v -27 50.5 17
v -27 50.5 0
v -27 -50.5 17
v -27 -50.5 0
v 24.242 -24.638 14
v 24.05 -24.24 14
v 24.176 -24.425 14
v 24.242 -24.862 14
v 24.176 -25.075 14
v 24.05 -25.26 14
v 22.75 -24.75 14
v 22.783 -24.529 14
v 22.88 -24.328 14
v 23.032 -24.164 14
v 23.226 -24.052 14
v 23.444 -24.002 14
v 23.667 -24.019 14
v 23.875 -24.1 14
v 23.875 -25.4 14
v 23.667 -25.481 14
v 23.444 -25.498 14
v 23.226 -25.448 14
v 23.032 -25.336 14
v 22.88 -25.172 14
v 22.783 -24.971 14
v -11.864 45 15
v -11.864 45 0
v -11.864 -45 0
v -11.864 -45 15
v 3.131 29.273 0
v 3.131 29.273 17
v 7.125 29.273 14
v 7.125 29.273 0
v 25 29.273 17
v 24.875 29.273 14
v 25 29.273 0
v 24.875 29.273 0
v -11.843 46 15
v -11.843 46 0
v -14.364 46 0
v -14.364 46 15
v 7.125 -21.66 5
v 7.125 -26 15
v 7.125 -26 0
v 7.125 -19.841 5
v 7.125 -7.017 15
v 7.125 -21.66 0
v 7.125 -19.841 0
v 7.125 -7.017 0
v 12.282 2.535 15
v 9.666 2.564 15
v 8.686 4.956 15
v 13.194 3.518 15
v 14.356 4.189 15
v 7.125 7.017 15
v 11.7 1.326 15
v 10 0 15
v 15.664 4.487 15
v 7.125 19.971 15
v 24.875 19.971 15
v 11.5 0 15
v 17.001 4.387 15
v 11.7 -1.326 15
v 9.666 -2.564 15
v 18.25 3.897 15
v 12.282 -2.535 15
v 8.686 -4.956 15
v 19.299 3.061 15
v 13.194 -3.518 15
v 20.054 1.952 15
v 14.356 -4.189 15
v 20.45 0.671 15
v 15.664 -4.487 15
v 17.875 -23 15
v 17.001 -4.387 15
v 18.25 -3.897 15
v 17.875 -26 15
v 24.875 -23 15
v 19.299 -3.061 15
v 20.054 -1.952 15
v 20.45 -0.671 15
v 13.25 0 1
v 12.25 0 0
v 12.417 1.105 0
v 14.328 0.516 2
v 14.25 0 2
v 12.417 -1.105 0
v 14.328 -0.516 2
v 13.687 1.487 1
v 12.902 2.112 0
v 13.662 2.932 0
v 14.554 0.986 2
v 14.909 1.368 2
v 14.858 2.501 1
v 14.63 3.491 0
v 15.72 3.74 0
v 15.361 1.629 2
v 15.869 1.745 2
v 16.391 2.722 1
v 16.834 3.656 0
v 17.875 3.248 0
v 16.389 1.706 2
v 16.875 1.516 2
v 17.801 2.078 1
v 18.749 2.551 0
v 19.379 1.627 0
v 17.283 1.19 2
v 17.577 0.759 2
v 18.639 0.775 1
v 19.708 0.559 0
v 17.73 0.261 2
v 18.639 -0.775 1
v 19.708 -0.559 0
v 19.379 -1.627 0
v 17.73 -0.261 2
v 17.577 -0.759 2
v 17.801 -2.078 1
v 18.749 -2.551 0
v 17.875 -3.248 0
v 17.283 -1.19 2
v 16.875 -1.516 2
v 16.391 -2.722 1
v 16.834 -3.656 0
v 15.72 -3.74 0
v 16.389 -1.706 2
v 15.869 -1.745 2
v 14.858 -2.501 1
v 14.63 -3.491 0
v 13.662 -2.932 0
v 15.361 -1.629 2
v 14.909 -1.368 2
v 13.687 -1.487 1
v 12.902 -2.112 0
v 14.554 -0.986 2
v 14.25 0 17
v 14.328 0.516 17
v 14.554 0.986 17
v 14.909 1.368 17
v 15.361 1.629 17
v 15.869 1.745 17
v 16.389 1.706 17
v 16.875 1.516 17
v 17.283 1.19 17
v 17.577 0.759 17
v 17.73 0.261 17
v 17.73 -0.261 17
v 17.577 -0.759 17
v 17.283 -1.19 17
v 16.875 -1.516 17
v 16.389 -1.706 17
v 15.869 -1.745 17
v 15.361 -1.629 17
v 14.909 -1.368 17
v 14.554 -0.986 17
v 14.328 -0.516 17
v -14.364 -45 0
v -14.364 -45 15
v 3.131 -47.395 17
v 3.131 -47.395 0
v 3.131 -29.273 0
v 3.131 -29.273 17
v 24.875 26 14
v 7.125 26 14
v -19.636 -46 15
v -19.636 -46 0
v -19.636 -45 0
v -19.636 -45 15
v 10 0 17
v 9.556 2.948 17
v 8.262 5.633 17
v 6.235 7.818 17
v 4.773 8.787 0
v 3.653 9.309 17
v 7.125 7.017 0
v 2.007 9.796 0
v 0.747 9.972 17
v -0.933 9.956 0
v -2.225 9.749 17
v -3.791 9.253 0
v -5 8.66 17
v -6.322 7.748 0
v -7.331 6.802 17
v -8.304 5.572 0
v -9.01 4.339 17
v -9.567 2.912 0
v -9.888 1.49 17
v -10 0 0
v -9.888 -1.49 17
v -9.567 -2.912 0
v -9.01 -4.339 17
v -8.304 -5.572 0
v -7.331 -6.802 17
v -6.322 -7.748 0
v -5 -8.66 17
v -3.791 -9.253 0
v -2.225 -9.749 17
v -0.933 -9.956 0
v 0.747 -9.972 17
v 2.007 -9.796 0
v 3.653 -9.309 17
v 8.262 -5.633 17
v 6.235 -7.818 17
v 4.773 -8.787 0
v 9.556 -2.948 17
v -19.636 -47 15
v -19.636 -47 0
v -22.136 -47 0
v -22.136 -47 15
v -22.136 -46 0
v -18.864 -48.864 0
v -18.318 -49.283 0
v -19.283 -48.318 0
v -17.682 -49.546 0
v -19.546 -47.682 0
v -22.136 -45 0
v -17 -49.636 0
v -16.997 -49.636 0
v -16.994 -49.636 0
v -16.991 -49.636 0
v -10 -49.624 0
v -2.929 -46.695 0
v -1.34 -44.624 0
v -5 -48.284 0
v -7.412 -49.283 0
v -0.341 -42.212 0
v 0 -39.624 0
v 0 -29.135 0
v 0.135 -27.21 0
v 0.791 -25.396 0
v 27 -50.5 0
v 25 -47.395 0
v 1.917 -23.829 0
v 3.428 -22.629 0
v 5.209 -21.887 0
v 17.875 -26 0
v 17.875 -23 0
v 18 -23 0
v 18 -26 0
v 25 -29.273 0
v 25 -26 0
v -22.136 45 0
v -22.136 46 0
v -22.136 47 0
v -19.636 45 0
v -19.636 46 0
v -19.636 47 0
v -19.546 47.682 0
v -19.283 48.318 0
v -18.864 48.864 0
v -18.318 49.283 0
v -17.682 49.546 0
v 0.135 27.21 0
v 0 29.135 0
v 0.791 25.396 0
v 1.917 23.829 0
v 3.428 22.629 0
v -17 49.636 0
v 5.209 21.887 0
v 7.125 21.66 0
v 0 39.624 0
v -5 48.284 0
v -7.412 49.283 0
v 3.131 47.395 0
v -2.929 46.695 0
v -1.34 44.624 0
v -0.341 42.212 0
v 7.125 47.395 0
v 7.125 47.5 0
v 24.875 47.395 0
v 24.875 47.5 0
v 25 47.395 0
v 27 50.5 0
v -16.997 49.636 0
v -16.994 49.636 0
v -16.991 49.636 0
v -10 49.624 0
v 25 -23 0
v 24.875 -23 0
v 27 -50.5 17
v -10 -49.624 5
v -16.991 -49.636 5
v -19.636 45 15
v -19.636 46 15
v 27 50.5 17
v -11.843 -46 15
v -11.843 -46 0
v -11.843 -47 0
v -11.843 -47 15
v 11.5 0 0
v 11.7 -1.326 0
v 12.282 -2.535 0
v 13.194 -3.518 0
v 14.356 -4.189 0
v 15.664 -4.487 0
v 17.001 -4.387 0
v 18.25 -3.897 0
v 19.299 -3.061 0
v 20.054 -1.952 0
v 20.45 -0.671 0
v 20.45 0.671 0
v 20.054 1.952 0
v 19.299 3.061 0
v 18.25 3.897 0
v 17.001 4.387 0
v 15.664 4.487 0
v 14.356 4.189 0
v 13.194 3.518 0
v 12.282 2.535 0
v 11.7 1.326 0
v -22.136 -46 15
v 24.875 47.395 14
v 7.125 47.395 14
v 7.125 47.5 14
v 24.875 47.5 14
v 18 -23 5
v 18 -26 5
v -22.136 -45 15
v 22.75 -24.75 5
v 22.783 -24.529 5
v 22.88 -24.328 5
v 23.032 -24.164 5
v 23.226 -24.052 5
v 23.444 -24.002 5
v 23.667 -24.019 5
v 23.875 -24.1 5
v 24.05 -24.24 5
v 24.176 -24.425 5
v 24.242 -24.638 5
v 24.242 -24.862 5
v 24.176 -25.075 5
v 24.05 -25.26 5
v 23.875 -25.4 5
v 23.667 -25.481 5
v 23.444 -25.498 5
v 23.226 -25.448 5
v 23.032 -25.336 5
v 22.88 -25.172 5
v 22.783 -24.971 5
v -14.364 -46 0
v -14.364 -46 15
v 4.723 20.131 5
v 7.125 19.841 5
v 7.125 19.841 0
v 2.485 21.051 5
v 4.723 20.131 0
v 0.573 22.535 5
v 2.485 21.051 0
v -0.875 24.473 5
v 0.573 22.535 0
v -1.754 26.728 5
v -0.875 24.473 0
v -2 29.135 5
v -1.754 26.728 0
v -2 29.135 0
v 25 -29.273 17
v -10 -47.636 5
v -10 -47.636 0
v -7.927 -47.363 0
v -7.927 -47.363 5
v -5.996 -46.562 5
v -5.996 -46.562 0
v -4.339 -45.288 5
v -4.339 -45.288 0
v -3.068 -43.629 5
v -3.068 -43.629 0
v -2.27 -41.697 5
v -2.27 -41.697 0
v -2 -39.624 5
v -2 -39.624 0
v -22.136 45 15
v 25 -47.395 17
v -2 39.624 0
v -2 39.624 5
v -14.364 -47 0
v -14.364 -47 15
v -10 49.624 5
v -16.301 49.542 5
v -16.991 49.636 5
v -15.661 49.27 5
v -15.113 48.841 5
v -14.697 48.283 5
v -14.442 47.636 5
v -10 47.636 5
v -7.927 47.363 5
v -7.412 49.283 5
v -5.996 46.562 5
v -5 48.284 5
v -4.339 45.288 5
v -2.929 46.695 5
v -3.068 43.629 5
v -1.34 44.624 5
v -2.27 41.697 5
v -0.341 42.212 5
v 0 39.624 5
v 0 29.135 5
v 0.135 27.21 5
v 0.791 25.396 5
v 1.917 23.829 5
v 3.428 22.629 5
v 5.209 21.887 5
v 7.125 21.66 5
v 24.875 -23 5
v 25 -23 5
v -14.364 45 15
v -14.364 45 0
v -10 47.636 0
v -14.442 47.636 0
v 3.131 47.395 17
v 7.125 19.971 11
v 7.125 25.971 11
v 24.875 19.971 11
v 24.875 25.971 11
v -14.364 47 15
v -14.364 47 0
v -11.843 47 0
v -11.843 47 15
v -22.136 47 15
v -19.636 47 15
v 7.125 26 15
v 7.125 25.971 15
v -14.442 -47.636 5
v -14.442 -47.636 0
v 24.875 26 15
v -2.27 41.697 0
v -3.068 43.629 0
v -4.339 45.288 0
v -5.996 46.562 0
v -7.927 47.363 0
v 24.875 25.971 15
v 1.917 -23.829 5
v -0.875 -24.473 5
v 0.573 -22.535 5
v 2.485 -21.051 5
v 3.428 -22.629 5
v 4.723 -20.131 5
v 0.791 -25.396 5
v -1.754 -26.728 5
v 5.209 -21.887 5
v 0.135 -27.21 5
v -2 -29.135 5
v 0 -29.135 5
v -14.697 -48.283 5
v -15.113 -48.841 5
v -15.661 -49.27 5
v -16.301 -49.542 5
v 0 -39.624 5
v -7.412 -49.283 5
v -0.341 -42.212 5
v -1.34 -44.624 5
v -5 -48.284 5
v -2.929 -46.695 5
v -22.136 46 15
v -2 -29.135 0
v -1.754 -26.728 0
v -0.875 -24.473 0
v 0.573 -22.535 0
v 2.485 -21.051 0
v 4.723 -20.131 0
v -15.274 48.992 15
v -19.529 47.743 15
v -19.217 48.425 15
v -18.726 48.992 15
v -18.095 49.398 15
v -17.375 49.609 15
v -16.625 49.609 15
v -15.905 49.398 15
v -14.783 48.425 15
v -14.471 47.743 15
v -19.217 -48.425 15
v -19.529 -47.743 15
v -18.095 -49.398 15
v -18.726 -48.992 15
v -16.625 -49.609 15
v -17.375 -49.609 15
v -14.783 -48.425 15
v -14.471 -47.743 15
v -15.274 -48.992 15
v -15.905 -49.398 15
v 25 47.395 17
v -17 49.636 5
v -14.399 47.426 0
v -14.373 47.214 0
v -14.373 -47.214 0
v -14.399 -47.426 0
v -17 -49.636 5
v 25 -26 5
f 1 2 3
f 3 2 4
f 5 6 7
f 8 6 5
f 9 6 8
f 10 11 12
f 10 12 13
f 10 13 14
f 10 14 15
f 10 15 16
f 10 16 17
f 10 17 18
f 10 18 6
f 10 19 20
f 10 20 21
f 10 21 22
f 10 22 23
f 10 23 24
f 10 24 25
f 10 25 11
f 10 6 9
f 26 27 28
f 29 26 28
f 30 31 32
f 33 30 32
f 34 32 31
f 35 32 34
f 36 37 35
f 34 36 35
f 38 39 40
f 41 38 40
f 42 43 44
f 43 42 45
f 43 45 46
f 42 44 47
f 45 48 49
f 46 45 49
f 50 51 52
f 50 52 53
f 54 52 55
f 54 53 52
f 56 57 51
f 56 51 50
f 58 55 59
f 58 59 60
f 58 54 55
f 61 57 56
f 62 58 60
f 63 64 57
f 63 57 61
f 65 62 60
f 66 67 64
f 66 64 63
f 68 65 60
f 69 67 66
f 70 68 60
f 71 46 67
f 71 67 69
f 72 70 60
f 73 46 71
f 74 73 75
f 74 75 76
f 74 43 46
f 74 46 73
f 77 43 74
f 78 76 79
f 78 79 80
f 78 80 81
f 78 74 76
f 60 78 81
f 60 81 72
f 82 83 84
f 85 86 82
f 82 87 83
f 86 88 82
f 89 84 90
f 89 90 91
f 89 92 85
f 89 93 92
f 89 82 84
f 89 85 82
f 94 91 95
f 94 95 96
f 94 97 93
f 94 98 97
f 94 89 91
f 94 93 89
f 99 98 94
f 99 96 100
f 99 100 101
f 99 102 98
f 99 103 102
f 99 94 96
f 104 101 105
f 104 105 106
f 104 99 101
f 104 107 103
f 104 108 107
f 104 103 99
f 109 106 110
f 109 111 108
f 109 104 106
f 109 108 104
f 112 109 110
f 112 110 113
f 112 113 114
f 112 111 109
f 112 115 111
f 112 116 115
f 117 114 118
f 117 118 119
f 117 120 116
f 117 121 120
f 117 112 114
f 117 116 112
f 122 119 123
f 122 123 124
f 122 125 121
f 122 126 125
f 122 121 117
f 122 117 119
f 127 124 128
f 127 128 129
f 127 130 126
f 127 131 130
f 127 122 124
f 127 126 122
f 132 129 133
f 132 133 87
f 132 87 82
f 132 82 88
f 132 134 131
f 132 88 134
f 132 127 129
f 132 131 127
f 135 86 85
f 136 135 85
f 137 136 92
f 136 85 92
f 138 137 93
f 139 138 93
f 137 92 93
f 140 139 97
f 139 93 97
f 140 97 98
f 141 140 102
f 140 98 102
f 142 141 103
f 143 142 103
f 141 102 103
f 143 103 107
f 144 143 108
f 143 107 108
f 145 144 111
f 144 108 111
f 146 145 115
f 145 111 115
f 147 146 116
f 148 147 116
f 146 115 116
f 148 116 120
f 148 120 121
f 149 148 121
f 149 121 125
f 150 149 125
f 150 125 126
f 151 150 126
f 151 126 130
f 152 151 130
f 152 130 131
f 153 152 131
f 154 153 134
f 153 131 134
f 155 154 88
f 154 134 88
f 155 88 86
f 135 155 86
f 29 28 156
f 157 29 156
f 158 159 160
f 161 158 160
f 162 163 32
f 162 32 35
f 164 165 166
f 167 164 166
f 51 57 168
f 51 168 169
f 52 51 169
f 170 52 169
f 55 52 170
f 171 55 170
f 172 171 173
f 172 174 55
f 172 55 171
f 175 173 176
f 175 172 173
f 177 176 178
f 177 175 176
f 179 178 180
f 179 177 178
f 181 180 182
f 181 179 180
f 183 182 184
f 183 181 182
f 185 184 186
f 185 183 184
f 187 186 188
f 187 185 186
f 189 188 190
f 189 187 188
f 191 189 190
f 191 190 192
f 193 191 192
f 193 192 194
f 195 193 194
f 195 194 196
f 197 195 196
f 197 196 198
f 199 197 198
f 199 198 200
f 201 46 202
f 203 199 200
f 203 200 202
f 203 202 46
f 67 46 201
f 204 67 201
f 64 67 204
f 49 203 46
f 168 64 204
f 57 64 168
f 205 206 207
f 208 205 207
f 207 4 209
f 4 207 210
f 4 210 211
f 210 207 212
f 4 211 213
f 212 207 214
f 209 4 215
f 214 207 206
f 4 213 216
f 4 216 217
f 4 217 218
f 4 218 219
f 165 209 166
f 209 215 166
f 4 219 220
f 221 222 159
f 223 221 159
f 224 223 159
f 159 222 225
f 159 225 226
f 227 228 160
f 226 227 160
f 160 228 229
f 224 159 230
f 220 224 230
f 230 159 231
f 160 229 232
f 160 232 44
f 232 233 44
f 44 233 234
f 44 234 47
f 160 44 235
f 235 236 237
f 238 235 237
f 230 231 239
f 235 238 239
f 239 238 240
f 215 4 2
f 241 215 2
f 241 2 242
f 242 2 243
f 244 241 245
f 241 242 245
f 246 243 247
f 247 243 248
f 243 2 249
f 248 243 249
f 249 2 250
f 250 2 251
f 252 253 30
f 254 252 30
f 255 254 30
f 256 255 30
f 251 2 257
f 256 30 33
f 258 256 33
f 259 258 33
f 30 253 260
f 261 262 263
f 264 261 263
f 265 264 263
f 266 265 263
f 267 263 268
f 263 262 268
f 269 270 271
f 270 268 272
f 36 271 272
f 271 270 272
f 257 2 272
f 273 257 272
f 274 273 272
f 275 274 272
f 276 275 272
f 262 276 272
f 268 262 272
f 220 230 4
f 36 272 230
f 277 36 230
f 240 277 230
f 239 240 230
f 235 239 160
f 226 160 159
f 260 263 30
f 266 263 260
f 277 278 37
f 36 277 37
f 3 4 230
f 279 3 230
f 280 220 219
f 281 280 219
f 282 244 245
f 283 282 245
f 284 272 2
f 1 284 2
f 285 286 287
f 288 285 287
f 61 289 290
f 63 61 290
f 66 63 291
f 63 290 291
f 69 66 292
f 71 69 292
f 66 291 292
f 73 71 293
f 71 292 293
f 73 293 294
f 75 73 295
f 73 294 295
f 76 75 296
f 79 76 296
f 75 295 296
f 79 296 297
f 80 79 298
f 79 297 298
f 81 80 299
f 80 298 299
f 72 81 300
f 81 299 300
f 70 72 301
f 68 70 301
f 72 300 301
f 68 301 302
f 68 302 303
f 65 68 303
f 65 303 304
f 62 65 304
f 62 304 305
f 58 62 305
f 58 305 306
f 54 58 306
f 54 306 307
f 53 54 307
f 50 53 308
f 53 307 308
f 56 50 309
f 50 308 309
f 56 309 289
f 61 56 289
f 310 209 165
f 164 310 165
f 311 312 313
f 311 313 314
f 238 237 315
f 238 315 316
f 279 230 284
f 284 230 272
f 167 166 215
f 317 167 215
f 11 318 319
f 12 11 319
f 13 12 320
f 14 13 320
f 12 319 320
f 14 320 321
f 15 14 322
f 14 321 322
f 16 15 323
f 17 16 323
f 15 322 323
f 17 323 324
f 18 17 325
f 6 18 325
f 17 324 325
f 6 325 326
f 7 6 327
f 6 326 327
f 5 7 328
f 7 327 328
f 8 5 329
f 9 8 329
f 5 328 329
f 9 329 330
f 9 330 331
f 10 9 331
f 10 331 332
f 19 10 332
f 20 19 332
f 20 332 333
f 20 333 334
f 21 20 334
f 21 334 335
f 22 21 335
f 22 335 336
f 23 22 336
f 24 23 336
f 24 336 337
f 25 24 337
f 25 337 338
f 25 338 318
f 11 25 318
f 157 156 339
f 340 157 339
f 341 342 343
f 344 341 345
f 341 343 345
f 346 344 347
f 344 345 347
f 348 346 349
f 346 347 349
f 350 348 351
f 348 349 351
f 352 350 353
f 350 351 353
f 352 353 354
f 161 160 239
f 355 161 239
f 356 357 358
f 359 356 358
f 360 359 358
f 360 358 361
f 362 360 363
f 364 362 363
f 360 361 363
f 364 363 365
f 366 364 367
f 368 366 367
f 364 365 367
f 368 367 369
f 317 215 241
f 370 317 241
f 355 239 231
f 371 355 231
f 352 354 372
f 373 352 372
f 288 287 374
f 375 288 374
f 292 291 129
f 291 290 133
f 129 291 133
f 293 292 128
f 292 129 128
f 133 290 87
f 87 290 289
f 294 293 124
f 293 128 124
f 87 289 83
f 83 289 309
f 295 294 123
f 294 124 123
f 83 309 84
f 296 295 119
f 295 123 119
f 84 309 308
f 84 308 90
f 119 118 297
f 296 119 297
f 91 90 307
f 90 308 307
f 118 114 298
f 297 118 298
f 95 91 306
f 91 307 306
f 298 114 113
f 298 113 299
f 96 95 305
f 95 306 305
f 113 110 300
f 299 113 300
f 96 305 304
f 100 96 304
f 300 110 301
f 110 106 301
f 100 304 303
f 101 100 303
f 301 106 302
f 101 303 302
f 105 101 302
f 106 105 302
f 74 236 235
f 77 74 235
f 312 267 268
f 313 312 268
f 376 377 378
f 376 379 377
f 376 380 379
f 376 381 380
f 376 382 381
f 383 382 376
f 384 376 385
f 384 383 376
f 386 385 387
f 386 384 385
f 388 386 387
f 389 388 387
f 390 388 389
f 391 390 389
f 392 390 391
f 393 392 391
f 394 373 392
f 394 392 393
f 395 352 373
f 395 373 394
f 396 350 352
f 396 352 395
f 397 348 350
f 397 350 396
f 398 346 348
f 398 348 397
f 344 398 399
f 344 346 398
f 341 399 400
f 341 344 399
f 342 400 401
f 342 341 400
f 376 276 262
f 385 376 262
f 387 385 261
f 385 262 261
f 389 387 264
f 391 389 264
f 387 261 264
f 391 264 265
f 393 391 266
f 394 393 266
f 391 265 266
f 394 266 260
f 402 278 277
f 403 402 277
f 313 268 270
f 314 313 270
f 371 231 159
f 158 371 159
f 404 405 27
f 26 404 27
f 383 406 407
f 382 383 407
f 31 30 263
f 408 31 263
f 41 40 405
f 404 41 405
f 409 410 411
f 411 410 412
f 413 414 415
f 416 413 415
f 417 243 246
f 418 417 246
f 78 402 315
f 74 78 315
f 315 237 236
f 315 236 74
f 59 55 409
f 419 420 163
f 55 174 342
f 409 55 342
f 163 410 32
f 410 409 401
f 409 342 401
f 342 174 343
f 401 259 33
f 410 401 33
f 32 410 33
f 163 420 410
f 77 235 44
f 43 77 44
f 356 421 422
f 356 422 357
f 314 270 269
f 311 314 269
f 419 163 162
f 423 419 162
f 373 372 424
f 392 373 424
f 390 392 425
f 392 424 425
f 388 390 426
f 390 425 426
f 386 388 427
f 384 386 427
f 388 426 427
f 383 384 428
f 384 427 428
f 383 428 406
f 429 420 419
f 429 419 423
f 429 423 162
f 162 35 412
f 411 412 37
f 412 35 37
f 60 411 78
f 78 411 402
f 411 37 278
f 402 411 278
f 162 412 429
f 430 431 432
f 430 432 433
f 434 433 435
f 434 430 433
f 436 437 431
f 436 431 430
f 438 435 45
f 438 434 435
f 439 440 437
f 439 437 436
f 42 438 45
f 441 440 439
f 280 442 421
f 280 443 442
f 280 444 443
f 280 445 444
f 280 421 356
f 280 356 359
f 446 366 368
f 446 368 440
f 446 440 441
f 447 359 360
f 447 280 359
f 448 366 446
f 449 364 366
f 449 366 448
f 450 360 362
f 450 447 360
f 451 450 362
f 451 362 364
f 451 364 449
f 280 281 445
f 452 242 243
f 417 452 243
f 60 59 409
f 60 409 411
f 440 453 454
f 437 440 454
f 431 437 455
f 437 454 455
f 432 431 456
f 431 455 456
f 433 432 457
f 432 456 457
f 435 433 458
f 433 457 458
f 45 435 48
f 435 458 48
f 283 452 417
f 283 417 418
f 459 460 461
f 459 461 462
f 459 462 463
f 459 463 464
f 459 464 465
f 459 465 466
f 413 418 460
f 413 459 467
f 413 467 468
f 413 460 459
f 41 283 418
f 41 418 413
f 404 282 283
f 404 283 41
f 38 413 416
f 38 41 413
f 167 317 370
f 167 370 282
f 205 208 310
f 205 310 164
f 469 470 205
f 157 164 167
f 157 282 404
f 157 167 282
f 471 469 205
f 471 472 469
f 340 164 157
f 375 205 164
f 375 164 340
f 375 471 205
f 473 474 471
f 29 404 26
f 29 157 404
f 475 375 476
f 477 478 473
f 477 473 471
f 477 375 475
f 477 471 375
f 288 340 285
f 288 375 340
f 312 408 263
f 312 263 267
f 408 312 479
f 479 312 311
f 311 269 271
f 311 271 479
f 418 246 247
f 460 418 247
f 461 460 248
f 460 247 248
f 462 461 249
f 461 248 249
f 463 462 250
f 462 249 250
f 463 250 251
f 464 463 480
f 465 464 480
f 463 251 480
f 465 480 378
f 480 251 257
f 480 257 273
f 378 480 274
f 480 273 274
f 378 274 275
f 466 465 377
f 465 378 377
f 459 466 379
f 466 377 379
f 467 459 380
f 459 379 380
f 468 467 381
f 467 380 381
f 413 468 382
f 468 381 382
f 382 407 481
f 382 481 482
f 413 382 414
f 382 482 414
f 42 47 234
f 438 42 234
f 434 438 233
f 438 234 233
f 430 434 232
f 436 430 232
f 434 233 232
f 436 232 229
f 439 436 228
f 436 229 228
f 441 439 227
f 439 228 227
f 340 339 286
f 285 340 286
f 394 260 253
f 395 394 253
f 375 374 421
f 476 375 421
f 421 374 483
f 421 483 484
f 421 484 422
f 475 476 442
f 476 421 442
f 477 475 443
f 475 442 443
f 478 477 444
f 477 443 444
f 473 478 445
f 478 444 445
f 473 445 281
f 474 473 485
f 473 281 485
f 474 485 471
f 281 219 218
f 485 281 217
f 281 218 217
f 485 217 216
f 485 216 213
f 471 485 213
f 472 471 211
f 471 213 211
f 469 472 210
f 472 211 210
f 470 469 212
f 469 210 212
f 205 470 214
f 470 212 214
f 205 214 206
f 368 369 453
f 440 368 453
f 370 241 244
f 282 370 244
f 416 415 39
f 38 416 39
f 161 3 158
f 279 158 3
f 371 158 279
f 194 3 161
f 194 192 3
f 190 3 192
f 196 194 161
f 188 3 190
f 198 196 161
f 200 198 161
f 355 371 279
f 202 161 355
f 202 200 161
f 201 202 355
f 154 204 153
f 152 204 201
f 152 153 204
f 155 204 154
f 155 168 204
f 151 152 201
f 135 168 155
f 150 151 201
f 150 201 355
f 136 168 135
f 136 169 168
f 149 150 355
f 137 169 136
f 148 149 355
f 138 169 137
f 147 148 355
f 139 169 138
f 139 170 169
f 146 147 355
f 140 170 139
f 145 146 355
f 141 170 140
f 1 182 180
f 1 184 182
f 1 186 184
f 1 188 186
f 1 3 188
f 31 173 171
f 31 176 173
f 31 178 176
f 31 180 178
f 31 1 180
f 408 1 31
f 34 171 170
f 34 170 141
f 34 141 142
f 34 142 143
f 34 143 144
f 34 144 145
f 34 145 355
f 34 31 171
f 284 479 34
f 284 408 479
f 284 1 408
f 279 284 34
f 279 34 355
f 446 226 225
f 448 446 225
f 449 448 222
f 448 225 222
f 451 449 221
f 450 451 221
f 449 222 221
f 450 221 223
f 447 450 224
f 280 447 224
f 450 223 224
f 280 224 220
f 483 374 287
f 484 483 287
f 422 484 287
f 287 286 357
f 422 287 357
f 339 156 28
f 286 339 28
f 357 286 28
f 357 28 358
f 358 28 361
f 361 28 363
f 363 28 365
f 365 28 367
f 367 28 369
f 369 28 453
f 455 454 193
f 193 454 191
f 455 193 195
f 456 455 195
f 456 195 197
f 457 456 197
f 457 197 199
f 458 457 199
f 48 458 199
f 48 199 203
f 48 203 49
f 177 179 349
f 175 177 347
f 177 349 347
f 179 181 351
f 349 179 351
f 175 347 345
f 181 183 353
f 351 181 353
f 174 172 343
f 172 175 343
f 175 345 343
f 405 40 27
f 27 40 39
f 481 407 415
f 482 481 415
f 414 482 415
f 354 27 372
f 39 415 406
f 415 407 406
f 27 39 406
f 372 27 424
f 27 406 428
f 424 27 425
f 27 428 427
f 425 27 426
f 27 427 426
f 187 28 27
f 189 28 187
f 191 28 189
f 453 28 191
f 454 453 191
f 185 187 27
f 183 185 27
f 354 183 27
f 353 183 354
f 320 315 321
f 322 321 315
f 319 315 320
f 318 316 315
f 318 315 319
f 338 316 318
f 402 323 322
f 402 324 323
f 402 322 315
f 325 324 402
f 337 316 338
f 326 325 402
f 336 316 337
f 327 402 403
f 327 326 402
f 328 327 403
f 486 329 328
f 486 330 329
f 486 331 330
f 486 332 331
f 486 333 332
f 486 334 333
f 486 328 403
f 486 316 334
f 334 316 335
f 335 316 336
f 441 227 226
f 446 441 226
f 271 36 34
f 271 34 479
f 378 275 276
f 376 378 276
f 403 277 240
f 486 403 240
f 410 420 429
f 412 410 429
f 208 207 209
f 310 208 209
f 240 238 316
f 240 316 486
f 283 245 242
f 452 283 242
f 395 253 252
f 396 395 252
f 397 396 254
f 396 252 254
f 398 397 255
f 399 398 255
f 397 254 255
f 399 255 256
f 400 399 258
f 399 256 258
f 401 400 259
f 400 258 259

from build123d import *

# Parameters (mm, degrees)
F0_R      = 10
F0_W      = 21.869414486
F0_H      = 18.1213598698
F1_DEPTH  = 17
F3_DEPTH  = 15
F4_W      = 7
F4_H      = 3
F5_DEPTH  = 5
F7_DEPTH  = 14
F8_SIZE   = 2
F9_W      = 18
F9_H      = 6
F10_DEPTH = 6


# Not quite as in the source:
# - a feature names something its author has since deleted; it is built from what else it names


with BuildPart() as f1:
    # F0 (on Top) → F1 (new body)
    with BuildSketch(Plane.XY):
        Polygon((27, -38.3339710534), (27, 50.5), (-27, 50.5), (-27, -50.5), (27, -50.5), align=None)
        Polygon((25, -29.2732911184), (25, -38.3339710534), (25, -47.3946509883), (3.130585514, -47.3946509883), (3.130585514, -29.2732911184), align=None, mode=Mode.SUBTRACT)
        Circle(F0_R, mode=Mode.SUBTRACT)
        with BuildLine():
            ThreePointArc((17.75, 0), (16, -1.75), (14.25, 0))
            ThreePointArc((14.25, 0), (16, 1.75), (17.75, 0))
        make_face(mode=Mode.SUBTRACT)
        with Locations((14.065292757, 38.3339710534)):
            Rectangle(F0_W, F0_H, mode=Mode.SUBTRACT)
    extrude(amount=F1_DEPTH)

    # F2 (on face) → F3 (cut)
    with BuildSketch(Plane(origin=(0, 0, 0), x_dir=(1, 0, 0), z_dir=(0, 0, -1))):
        Polygon((7.125, 26), (7.125, 0), (7.125, -26), (24.875, -26), (24.875, 23), (17.875, 23), (17.875, 26), align=None)
        with BuildLine():
            ThreePointArc((20.5, 0), (16, -4.5), (11.5, 0))
            ThreePointArc((11.5, 0), (16, 4.5), (20.5, 0))
        make_face(mode=Mode.SUBTRACT)
        with BuildLine():
            Line((-11.8641304348, -45), (-11.8641304348, 0))
            Line((-11.8641304348, 0), (-11.8641304348, 45))
            Line((-11.8641304348, 45), (-14.3641304348, 45))
            Line((-14.3641304348, 45), (-14.3641304348, 46))
            Line((-14.3641304348, 46), (-11.8431356333, 46))
            Line((-11.8431356333, 46), (-11.8431356333, 47))
            Line((-11.8431356333, 47), (-14.3641304348, 47))
            ThreePointArc((-14.3641304348, 47), (-17, 49.6358695652), (-19.6358695652, 47))
            Line((-19.6358695652, 47), (-22.1358695652, 47))
            Line((-22.1358695652, 47), (-22.1358695652, 46))
            Line((-22.1358695652, 46), (-19.6358695652, 46))
            Line((-19.6358695652, 46), (-19.6358695652, 45))
            Line((-19.6358695652, 45), (-22.1358695652, 45))
            Line((-22.1358695652, 45), (-22.1358695652, -45))
            Line((-22.1358695652, -45), (-19.6358695652, -45))
            Line((-19.6358695652, -45), (-19.6358695652, -46))
            Line((-19.6358695652, -46), (-22.1358695652, -46))
            Line((-22.1358695652, -46), (-22.1358695652, -47))
            Line((-22.1358695652, -47), (-19.6358695652, -47))
            ThreePointArc((-19.6358695652, -47), (-17, -49.6358695652), (-14.3641304348, -47))
            Line((-14.3641304348, -47), (-11.8431356333, -47))
            Line((-11.8431356333, -47), (-11.8431356333, -46))
            Line((-11.8431356333, -46), (-14.3641304348, -46))
            Line((-14.3641304348, -46), (-14.3641304348, -45))
            Line((-14.3641304348, -45), (-11.8641304348, -45))
        make_face()
    extrude(amount=-F3_DEPTH, mode=Mode.SUBTRACT)

    # F4 (on face) → F5 (cut)
    with BuildSketch(Plane(origin=(0, 0, 0), x_dir=(1, 0, 0), z_dir=(0, 0, -1))):
        with Locations((21.5, 24.5)):
            Rectangle(F4_W, F4_H)
        with BuildLine():
            Line((0, 29.1349645704), (0, 39.6236035006))
            ThreePointArc((0, 39.6236035006), (-2.9289321881, 46.6946713125), (-10, 49.6236035006))
            Line((-10, 49.6236035006), (-17, 49.6358695652))
            Line((-17, 49.6358695652), (-17, 47.6358695652))
            Line((-17, 47.6358695652), (-10, 47.6358695652))
            ThreePointArc((-10, 47.6358695652), (-4.3388107028, 45.2883854424), (-2.0000094035, 39.6236035006))
            Line((-2.0000094035, 39.6236035006), (-2.0000094035, 29.1349645704))
            ThreePointArc((-2.0000094035, 29.1349645704), (0.5848933582, 22.5223852264), (7.1590254083, 19.8412071913))
            Line((7.1590254083, 19.8412071913), (7.125, 21.6599348028))
            ThreePointArc((7.125, 21.6599348028), (1.9168065811, 23.8288183935), (0, 29.1349645704))
        make_face()
        with BuildLine():
            ThreePointArc((7.1590254083, -19.8412071913), (0.5848933582, -22.5223852264), (-2.0000094035, -29.1349645704))
            Line((-2.0000094035, -29.1349645704), (-2.0000094035, -39.6236035006))
            ThreePointArc((-2.0000094035, -39.6236035006), (-4.3388107028, -45.2883854424), (-10, -47.6358695652))
            Line((-10, -47.6358695652), (-17, -47.6358695652))
            Line((-17, -47.6358695652), (-17, -49.6358695652))
            Line((-17, -49.6358695652), (-10, -49.6236035006))
            ThreePointArc((-10, -49.6236035006), (-2.9289321881, -46.6946713125), (0, -39.6236035006))
            Line((0, -39.6236035006), (0, -29.1349645704))
            ThreePointArc((0, -29.1349645704), (1.9168065811, -23.8288183935), (7.125, -21.6599348028))
            Line((7.125, -21.6599348028), (7.1590254083, -19.8412071913))
        make_face()
    extrude(amount=-F5_DEPTH, mode=Mode.SUBTRACT)

    # F6 (on face) → F7 (cut)
    with BuildSketch(Plane(origin=(0, 0, 0), x_dir=(1, 0, 0), z_dir=(0, 0, -1))):
        with BuildLine():
            ThreePointArc((24.25, 24.75), (23.5, 25.5), (22.75, 24.75))
            ThreePointArc((22.75, 24.75), (23.5, 24), (24.25, 24.75))
        make_face()
        Polygon((7.125, -26), (7.125, -36.75), (7.125, -47.5), (24.875, -47.5), (24.875, -26), align=None)
    extrude(amount=-F7_DEPTH, mode=Mode.SUBTRACT)

    # F8
    f8_edges = [f1.edges().sort_by_distance(p)[0] for p in [
        (14.25, 0, 0),
    ]]
    chamfer(f8_edges, length=F8_SIZE)

    # F9 (on face) → F10 (join)
    with BuildSketch(Plane.XY.offset(17)):
        with Locations((16.0392038773, 22.9714149609)):
            Rectangle(F9_W, F9_H)
    extrude(amount=-F10_DEPTH)


solid = f1.part
